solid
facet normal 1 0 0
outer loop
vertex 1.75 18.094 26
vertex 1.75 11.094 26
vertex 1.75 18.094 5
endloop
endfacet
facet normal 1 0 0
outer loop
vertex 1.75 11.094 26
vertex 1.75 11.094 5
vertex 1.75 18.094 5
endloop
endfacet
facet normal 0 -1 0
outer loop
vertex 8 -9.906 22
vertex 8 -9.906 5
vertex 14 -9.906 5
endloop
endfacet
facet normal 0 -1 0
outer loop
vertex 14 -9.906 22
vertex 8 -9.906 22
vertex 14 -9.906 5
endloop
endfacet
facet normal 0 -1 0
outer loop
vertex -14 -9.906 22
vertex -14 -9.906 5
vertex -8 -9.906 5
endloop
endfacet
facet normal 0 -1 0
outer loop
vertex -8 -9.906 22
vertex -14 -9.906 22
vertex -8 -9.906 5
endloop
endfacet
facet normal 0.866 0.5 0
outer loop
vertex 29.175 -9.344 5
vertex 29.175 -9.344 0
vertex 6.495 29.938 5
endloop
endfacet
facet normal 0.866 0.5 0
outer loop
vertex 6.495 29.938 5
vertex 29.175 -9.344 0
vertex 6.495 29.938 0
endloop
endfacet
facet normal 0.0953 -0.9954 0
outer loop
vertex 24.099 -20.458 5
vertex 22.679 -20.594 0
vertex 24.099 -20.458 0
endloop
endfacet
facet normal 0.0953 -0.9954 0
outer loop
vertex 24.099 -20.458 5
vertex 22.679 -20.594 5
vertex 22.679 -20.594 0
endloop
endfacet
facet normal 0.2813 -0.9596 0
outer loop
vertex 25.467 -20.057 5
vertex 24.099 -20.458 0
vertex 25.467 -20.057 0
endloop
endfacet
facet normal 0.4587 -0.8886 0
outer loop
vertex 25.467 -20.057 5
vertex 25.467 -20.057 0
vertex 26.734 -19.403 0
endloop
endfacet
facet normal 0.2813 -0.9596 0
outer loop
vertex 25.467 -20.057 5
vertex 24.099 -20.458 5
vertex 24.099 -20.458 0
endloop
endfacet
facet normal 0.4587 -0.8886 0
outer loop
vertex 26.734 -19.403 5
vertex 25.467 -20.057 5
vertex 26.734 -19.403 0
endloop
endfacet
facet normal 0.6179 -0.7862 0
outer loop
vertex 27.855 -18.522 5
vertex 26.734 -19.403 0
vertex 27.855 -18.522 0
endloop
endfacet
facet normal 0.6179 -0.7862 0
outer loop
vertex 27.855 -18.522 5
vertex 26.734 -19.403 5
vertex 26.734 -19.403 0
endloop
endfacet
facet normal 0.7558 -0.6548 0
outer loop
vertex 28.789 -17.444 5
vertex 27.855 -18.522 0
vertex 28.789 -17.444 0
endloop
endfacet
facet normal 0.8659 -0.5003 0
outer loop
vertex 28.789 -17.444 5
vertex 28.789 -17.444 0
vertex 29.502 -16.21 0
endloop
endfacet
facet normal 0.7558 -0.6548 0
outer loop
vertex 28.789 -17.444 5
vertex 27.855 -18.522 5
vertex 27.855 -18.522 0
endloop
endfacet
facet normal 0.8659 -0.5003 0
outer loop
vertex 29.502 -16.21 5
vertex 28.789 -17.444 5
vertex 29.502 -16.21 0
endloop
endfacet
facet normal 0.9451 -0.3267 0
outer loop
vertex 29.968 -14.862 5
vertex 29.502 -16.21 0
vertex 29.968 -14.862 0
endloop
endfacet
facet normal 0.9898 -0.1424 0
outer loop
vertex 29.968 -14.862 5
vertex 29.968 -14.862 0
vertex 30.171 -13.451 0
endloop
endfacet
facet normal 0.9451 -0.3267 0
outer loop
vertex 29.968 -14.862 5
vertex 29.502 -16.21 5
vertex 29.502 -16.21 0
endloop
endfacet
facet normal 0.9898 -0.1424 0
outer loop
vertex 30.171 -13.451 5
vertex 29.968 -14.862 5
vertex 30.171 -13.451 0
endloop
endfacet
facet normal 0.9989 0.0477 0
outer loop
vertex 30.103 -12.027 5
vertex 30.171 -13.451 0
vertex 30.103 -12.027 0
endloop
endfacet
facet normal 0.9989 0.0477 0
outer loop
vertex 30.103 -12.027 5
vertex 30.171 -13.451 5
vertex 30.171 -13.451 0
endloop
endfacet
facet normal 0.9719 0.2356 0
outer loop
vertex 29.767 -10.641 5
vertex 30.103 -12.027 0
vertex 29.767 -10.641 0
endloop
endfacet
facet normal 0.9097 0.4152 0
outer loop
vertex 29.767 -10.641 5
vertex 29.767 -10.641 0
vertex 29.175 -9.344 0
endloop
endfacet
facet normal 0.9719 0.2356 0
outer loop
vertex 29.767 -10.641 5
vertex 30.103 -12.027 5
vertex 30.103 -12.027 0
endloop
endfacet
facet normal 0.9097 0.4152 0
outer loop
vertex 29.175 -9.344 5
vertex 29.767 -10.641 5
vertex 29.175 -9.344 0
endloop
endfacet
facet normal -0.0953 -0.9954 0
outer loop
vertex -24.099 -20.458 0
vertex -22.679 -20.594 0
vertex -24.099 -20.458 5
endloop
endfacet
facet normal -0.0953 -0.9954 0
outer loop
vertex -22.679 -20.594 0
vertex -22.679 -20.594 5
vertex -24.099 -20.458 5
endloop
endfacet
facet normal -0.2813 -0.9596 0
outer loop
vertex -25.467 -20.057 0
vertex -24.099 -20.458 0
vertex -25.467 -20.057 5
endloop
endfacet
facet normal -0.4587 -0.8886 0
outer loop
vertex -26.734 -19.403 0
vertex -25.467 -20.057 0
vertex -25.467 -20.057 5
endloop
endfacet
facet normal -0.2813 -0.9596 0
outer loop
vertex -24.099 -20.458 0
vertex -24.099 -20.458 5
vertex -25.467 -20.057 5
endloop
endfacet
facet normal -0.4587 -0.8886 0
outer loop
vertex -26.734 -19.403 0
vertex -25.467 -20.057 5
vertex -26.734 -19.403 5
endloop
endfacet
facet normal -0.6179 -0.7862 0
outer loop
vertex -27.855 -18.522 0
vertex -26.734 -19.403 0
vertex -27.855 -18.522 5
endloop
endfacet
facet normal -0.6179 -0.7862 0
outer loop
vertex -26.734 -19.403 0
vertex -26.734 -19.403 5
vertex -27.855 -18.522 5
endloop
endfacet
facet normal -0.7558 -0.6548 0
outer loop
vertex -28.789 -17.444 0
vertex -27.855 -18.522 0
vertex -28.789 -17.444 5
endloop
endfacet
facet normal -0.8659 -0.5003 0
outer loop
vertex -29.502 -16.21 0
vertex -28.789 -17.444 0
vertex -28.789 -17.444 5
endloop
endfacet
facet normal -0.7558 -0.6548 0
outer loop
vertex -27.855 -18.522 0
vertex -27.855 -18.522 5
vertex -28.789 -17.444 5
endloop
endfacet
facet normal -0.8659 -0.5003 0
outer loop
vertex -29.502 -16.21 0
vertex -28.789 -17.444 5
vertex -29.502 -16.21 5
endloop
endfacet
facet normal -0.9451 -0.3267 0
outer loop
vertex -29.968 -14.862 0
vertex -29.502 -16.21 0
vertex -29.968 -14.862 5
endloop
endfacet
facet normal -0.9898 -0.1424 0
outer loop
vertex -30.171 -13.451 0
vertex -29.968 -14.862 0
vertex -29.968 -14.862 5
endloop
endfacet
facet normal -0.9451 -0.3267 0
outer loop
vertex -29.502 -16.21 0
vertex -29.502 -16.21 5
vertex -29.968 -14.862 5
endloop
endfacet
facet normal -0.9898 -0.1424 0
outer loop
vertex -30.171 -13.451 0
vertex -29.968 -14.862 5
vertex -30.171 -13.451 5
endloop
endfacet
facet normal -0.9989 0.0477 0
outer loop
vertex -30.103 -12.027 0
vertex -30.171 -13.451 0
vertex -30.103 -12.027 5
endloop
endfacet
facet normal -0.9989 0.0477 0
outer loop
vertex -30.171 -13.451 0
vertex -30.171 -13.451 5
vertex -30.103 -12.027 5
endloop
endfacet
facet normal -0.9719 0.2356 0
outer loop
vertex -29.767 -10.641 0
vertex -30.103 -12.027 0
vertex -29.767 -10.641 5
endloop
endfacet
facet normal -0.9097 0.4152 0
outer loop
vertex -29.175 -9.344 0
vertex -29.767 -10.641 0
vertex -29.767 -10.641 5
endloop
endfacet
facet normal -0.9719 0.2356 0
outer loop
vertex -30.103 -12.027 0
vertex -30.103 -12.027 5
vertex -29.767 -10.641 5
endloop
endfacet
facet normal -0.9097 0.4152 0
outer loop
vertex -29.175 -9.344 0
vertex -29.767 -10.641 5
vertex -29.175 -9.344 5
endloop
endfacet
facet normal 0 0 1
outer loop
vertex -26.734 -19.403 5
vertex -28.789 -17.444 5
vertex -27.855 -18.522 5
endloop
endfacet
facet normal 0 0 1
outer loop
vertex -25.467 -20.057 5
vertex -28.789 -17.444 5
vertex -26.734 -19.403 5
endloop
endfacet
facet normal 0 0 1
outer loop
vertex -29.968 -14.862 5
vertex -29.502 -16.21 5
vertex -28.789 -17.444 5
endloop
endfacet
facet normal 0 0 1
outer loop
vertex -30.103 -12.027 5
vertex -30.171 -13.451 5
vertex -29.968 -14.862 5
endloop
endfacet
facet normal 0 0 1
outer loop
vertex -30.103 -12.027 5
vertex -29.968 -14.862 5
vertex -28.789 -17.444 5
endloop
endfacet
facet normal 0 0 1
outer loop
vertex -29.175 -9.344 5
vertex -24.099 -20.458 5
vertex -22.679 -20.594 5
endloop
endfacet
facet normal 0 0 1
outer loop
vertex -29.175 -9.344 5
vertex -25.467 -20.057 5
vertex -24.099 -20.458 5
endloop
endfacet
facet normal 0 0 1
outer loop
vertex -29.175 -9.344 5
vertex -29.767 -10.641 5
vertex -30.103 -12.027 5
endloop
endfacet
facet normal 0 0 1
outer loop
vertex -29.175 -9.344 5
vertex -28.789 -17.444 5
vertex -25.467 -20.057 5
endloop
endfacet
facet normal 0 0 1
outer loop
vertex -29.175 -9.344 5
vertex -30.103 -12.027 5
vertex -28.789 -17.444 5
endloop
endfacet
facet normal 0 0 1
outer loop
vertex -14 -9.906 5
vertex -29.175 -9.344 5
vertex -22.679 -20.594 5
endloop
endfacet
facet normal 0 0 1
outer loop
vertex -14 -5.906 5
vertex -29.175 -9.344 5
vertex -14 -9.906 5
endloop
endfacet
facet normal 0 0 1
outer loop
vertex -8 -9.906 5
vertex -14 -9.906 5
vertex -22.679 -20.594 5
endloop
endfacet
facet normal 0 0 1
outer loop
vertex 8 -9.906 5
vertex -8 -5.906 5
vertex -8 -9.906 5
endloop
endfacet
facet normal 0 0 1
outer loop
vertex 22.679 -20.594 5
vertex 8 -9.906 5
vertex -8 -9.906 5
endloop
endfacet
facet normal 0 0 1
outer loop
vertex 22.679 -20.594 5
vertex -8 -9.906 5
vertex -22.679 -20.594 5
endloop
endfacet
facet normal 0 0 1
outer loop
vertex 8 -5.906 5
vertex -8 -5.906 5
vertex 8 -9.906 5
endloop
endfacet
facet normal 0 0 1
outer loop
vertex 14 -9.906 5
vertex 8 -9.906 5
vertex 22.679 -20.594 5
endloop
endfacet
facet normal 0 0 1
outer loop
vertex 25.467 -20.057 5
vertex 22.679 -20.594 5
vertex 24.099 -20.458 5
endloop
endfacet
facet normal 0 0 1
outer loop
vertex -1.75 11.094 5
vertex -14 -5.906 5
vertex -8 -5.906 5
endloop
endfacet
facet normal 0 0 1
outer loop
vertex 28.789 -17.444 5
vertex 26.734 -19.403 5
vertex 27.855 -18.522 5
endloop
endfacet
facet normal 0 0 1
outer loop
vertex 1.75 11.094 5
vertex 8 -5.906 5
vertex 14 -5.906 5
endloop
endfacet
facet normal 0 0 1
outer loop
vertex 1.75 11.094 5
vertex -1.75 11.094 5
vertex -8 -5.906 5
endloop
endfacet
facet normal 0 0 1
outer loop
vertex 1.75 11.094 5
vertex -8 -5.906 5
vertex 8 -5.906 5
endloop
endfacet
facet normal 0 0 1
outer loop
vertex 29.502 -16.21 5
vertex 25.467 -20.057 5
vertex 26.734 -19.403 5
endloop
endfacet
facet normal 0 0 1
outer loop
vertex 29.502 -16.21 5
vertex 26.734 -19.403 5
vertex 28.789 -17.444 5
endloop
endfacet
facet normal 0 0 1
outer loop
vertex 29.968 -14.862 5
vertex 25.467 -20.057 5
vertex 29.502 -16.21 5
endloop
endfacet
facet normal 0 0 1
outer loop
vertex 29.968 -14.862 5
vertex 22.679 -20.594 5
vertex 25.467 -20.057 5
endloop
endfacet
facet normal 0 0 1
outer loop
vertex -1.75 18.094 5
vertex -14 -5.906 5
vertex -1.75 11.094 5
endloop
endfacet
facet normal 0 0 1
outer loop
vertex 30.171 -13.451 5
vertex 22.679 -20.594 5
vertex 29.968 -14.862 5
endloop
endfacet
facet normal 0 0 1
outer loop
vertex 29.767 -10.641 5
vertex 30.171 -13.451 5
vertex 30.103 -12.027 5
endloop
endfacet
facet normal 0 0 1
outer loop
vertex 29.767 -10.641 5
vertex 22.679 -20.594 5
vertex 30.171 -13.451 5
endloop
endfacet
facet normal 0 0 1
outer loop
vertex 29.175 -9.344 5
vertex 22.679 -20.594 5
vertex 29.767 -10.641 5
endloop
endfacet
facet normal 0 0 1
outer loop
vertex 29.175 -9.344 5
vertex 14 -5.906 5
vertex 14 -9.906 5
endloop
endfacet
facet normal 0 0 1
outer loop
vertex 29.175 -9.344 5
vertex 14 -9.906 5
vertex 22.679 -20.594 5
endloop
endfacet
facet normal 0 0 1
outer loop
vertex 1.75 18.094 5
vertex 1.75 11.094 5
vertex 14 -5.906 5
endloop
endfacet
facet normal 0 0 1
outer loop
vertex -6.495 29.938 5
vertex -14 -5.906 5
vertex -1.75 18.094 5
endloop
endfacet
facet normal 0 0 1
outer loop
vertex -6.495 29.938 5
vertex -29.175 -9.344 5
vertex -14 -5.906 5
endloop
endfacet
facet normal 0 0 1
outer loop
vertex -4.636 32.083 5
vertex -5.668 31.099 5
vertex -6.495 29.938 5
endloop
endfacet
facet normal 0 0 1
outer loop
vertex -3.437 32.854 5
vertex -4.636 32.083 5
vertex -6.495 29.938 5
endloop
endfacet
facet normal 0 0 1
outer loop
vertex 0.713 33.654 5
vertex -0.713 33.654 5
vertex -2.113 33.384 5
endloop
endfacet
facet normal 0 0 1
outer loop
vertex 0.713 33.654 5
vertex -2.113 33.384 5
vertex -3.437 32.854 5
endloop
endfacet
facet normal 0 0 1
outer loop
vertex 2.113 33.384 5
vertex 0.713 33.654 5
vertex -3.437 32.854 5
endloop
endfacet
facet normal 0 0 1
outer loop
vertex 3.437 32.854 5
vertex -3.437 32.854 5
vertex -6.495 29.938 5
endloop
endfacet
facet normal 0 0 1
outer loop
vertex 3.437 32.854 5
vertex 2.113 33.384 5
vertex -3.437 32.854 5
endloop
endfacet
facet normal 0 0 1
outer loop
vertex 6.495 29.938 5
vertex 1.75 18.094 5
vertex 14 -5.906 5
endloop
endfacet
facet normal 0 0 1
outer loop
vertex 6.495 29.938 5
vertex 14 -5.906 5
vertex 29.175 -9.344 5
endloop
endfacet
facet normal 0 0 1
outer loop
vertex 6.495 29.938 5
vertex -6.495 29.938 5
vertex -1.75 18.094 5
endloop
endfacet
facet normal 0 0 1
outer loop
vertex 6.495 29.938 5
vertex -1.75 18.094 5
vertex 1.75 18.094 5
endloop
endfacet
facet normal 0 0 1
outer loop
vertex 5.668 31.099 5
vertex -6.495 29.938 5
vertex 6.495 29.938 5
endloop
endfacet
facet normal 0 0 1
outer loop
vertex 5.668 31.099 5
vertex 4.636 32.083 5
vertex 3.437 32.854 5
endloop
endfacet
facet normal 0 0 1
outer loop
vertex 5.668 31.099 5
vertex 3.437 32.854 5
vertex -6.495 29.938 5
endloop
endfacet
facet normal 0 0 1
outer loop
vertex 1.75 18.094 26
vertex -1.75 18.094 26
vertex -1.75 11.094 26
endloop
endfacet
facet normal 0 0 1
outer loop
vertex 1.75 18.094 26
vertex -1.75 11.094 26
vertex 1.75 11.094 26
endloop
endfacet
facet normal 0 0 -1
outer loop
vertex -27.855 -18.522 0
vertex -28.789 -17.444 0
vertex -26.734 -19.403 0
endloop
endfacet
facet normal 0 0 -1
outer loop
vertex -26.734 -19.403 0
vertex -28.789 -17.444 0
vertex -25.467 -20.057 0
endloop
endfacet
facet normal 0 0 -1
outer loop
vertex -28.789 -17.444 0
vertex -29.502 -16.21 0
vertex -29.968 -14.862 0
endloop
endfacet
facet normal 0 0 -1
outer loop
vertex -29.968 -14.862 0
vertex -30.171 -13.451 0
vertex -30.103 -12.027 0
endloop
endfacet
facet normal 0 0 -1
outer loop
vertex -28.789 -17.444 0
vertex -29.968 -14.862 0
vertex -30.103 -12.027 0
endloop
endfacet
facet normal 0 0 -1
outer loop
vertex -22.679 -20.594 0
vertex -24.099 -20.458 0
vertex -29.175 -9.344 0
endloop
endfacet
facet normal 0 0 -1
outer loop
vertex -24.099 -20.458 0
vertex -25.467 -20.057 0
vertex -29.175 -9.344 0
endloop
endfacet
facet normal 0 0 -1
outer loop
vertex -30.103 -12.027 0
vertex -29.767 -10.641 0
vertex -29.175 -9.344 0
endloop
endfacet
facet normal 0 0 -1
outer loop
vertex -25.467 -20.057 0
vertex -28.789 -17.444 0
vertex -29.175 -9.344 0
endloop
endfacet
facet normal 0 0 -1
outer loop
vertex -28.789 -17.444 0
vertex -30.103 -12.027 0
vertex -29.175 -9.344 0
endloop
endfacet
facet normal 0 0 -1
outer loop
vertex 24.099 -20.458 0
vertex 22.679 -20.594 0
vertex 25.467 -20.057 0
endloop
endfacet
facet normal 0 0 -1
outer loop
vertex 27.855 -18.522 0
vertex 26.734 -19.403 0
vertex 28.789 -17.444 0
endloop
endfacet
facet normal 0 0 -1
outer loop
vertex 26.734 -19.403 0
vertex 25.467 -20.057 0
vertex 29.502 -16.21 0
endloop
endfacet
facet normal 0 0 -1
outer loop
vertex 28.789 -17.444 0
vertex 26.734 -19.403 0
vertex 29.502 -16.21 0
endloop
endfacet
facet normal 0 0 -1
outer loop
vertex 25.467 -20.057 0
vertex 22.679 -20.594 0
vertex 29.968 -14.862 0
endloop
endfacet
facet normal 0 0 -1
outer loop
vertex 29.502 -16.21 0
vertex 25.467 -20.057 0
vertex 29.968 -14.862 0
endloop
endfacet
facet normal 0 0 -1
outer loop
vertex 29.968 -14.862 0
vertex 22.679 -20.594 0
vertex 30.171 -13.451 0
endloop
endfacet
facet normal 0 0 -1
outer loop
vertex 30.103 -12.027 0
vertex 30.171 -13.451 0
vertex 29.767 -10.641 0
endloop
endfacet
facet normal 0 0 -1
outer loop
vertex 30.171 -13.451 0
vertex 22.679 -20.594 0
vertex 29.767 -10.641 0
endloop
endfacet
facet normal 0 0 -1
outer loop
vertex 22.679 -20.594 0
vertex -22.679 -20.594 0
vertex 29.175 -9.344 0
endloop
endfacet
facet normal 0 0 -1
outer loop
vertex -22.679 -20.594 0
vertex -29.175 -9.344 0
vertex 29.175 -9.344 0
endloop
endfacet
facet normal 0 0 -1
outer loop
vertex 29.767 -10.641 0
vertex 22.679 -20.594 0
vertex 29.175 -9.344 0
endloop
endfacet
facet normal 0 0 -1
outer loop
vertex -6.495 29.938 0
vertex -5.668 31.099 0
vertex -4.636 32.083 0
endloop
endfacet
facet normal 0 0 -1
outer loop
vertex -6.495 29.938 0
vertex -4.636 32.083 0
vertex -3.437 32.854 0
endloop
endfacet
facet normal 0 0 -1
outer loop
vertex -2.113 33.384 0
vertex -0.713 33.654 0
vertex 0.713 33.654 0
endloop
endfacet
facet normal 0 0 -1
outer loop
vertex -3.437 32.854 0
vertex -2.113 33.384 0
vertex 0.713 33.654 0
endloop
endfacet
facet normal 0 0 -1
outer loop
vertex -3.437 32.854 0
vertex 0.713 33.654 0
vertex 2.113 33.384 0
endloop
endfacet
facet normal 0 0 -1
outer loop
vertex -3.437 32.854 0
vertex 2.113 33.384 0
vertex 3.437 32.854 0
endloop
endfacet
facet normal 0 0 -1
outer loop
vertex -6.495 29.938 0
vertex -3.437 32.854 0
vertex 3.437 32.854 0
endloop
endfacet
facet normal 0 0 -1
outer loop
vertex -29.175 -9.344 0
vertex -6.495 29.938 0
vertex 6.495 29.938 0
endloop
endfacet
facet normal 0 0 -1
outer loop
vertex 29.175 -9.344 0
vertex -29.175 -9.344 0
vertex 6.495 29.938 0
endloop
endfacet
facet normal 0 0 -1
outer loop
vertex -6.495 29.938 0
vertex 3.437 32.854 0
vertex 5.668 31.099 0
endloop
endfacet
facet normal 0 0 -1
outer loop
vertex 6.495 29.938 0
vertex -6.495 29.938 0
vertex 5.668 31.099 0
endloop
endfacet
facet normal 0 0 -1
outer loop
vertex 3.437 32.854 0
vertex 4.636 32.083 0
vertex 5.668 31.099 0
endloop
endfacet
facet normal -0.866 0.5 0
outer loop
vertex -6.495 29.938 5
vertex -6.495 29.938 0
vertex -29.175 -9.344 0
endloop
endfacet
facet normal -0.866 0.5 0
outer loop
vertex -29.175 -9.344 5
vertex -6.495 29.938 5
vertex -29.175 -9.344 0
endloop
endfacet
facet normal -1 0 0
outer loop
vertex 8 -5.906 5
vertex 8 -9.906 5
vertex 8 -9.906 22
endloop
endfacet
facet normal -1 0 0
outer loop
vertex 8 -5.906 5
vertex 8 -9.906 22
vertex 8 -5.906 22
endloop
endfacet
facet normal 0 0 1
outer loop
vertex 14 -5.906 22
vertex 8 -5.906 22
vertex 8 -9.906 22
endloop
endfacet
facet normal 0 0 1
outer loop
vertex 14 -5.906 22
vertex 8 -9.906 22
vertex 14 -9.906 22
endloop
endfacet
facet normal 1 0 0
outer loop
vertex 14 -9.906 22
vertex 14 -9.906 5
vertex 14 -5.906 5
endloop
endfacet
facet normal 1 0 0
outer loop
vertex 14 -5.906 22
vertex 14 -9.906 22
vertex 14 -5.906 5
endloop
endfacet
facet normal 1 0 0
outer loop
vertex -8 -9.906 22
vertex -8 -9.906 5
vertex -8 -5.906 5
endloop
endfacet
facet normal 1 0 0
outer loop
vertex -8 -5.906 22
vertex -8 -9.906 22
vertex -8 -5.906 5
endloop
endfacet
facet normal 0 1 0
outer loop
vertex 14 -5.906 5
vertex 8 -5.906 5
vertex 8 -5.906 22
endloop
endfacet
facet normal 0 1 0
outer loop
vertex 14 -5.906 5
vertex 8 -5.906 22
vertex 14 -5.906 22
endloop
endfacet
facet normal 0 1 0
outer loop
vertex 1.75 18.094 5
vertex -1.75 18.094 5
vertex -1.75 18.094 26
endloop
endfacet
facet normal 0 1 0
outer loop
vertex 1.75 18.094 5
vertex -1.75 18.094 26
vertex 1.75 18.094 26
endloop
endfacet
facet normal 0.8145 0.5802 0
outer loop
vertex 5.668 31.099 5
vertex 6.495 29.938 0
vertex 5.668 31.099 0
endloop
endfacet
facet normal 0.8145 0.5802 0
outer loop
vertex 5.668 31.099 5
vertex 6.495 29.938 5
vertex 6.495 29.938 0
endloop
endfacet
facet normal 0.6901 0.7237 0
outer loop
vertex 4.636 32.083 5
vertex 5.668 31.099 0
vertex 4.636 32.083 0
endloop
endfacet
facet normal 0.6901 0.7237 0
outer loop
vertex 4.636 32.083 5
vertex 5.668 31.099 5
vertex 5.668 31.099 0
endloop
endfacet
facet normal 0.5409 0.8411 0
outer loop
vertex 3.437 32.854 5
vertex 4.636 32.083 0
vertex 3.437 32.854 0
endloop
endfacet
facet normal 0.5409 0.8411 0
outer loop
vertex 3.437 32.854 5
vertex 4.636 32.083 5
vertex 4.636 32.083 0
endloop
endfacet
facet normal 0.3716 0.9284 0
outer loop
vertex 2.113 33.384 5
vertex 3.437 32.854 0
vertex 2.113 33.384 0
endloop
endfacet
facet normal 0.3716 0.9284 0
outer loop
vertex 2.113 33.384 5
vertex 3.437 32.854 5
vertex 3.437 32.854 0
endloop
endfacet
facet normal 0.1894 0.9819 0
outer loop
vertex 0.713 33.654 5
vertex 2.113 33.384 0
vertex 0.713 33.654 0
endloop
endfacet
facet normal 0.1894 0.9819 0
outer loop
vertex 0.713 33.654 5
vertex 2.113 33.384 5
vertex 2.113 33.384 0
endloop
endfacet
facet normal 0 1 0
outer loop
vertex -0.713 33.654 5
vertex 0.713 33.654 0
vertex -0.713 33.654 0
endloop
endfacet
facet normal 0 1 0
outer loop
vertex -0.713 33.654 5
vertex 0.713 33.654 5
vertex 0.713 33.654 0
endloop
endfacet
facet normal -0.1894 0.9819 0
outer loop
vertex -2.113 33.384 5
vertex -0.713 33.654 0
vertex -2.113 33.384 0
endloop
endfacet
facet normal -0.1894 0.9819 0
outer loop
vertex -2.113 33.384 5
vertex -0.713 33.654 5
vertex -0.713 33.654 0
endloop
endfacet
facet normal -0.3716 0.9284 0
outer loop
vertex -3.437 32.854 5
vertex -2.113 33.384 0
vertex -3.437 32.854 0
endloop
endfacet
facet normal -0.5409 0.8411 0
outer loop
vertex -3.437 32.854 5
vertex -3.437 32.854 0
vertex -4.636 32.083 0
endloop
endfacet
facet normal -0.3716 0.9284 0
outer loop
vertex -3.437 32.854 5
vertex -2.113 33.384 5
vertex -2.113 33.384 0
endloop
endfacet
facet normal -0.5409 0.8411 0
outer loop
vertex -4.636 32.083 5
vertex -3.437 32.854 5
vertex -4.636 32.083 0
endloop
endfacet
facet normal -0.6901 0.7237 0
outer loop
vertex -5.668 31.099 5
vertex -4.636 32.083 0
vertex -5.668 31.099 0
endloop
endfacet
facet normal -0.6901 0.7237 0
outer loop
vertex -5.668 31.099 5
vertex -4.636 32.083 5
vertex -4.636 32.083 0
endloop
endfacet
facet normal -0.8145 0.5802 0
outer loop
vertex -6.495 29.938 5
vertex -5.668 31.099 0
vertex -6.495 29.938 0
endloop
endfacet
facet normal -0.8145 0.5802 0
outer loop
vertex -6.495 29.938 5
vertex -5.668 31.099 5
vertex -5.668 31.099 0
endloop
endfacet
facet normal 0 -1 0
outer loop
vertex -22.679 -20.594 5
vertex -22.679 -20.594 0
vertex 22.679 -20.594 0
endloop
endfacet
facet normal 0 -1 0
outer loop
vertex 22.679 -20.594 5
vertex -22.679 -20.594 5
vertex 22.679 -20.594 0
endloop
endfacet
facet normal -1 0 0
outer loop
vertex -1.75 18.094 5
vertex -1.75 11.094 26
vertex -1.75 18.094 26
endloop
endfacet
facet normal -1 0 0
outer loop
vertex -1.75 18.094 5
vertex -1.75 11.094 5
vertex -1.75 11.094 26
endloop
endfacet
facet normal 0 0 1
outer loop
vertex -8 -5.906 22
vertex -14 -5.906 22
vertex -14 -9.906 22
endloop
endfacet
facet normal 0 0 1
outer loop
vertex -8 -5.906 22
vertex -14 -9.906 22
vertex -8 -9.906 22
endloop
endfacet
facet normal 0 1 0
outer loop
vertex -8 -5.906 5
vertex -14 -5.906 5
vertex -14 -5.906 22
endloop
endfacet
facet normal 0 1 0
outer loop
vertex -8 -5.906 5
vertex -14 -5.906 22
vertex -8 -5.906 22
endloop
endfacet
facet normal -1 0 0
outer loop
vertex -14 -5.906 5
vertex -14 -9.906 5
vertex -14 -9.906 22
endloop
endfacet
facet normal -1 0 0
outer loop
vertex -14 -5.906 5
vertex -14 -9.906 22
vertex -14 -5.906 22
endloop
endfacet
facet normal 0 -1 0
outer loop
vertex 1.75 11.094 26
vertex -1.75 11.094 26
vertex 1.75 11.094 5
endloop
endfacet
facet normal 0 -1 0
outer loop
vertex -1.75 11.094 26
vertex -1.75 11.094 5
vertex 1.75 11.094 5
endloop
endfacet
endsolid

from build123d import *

# Parameters (mm, degrees)
F1_DEPTH  = 5
F2_R      = 7.5
F3_W      = 6
F3_H      = 4
F3_W_2    = 3.5
F3_H_2    = 7
F4_DEPTH  = 17
F4_FACE_W = 3.5
F4_FACE_H = 7
F5_DEPTH  = 4


with BuildPart() as f1:
    # F0 (on Top) → F1 (new body)
    with BuildSketch(Plane.XY):
        Polygon((-35.669873, -20.594011), (35.669873, -20.594011), (0, 41.188022), align=None)
    extrude(amount=F1_DEPTH)

    # F2
    f2_edges = [f1.edges().sort_by_distance(p)[0] for p in [
        (35.669873, -20.594011, 2.5),
        (0, 41.188022, 2.5),
        (-35.669873, -20.594011, 2.5),
    ]]
    fillet(f2_edges, radius=F2_R)

    # F3 (on face) → F4 (join)
    with BuildSketch(Plane.XY.offset(5)):
        with Locations((-11, -7.906166)):
            Rectangle(F3_W, F3_H)
        with Locations((11, -7.906166)):
            Rectangle(F3_W, F3_H)
        with Locations((0, 14.593834)):
            Rectangle(F3_W_2, F3_H_2)
    extrude(amount=F4_DEPTH)

    # F4_face (on face) → F5 (join)
    with BuildSketch(Plane(origin=(0, 14.593834, 22), x_dir=(1, 0, 0), z_dir=(0, 0, 1))):
        Rectangle(F4_FACE_W, F4_FACE_H)
    extrude(amount=F5_DEPTH)


solid = f1.part
